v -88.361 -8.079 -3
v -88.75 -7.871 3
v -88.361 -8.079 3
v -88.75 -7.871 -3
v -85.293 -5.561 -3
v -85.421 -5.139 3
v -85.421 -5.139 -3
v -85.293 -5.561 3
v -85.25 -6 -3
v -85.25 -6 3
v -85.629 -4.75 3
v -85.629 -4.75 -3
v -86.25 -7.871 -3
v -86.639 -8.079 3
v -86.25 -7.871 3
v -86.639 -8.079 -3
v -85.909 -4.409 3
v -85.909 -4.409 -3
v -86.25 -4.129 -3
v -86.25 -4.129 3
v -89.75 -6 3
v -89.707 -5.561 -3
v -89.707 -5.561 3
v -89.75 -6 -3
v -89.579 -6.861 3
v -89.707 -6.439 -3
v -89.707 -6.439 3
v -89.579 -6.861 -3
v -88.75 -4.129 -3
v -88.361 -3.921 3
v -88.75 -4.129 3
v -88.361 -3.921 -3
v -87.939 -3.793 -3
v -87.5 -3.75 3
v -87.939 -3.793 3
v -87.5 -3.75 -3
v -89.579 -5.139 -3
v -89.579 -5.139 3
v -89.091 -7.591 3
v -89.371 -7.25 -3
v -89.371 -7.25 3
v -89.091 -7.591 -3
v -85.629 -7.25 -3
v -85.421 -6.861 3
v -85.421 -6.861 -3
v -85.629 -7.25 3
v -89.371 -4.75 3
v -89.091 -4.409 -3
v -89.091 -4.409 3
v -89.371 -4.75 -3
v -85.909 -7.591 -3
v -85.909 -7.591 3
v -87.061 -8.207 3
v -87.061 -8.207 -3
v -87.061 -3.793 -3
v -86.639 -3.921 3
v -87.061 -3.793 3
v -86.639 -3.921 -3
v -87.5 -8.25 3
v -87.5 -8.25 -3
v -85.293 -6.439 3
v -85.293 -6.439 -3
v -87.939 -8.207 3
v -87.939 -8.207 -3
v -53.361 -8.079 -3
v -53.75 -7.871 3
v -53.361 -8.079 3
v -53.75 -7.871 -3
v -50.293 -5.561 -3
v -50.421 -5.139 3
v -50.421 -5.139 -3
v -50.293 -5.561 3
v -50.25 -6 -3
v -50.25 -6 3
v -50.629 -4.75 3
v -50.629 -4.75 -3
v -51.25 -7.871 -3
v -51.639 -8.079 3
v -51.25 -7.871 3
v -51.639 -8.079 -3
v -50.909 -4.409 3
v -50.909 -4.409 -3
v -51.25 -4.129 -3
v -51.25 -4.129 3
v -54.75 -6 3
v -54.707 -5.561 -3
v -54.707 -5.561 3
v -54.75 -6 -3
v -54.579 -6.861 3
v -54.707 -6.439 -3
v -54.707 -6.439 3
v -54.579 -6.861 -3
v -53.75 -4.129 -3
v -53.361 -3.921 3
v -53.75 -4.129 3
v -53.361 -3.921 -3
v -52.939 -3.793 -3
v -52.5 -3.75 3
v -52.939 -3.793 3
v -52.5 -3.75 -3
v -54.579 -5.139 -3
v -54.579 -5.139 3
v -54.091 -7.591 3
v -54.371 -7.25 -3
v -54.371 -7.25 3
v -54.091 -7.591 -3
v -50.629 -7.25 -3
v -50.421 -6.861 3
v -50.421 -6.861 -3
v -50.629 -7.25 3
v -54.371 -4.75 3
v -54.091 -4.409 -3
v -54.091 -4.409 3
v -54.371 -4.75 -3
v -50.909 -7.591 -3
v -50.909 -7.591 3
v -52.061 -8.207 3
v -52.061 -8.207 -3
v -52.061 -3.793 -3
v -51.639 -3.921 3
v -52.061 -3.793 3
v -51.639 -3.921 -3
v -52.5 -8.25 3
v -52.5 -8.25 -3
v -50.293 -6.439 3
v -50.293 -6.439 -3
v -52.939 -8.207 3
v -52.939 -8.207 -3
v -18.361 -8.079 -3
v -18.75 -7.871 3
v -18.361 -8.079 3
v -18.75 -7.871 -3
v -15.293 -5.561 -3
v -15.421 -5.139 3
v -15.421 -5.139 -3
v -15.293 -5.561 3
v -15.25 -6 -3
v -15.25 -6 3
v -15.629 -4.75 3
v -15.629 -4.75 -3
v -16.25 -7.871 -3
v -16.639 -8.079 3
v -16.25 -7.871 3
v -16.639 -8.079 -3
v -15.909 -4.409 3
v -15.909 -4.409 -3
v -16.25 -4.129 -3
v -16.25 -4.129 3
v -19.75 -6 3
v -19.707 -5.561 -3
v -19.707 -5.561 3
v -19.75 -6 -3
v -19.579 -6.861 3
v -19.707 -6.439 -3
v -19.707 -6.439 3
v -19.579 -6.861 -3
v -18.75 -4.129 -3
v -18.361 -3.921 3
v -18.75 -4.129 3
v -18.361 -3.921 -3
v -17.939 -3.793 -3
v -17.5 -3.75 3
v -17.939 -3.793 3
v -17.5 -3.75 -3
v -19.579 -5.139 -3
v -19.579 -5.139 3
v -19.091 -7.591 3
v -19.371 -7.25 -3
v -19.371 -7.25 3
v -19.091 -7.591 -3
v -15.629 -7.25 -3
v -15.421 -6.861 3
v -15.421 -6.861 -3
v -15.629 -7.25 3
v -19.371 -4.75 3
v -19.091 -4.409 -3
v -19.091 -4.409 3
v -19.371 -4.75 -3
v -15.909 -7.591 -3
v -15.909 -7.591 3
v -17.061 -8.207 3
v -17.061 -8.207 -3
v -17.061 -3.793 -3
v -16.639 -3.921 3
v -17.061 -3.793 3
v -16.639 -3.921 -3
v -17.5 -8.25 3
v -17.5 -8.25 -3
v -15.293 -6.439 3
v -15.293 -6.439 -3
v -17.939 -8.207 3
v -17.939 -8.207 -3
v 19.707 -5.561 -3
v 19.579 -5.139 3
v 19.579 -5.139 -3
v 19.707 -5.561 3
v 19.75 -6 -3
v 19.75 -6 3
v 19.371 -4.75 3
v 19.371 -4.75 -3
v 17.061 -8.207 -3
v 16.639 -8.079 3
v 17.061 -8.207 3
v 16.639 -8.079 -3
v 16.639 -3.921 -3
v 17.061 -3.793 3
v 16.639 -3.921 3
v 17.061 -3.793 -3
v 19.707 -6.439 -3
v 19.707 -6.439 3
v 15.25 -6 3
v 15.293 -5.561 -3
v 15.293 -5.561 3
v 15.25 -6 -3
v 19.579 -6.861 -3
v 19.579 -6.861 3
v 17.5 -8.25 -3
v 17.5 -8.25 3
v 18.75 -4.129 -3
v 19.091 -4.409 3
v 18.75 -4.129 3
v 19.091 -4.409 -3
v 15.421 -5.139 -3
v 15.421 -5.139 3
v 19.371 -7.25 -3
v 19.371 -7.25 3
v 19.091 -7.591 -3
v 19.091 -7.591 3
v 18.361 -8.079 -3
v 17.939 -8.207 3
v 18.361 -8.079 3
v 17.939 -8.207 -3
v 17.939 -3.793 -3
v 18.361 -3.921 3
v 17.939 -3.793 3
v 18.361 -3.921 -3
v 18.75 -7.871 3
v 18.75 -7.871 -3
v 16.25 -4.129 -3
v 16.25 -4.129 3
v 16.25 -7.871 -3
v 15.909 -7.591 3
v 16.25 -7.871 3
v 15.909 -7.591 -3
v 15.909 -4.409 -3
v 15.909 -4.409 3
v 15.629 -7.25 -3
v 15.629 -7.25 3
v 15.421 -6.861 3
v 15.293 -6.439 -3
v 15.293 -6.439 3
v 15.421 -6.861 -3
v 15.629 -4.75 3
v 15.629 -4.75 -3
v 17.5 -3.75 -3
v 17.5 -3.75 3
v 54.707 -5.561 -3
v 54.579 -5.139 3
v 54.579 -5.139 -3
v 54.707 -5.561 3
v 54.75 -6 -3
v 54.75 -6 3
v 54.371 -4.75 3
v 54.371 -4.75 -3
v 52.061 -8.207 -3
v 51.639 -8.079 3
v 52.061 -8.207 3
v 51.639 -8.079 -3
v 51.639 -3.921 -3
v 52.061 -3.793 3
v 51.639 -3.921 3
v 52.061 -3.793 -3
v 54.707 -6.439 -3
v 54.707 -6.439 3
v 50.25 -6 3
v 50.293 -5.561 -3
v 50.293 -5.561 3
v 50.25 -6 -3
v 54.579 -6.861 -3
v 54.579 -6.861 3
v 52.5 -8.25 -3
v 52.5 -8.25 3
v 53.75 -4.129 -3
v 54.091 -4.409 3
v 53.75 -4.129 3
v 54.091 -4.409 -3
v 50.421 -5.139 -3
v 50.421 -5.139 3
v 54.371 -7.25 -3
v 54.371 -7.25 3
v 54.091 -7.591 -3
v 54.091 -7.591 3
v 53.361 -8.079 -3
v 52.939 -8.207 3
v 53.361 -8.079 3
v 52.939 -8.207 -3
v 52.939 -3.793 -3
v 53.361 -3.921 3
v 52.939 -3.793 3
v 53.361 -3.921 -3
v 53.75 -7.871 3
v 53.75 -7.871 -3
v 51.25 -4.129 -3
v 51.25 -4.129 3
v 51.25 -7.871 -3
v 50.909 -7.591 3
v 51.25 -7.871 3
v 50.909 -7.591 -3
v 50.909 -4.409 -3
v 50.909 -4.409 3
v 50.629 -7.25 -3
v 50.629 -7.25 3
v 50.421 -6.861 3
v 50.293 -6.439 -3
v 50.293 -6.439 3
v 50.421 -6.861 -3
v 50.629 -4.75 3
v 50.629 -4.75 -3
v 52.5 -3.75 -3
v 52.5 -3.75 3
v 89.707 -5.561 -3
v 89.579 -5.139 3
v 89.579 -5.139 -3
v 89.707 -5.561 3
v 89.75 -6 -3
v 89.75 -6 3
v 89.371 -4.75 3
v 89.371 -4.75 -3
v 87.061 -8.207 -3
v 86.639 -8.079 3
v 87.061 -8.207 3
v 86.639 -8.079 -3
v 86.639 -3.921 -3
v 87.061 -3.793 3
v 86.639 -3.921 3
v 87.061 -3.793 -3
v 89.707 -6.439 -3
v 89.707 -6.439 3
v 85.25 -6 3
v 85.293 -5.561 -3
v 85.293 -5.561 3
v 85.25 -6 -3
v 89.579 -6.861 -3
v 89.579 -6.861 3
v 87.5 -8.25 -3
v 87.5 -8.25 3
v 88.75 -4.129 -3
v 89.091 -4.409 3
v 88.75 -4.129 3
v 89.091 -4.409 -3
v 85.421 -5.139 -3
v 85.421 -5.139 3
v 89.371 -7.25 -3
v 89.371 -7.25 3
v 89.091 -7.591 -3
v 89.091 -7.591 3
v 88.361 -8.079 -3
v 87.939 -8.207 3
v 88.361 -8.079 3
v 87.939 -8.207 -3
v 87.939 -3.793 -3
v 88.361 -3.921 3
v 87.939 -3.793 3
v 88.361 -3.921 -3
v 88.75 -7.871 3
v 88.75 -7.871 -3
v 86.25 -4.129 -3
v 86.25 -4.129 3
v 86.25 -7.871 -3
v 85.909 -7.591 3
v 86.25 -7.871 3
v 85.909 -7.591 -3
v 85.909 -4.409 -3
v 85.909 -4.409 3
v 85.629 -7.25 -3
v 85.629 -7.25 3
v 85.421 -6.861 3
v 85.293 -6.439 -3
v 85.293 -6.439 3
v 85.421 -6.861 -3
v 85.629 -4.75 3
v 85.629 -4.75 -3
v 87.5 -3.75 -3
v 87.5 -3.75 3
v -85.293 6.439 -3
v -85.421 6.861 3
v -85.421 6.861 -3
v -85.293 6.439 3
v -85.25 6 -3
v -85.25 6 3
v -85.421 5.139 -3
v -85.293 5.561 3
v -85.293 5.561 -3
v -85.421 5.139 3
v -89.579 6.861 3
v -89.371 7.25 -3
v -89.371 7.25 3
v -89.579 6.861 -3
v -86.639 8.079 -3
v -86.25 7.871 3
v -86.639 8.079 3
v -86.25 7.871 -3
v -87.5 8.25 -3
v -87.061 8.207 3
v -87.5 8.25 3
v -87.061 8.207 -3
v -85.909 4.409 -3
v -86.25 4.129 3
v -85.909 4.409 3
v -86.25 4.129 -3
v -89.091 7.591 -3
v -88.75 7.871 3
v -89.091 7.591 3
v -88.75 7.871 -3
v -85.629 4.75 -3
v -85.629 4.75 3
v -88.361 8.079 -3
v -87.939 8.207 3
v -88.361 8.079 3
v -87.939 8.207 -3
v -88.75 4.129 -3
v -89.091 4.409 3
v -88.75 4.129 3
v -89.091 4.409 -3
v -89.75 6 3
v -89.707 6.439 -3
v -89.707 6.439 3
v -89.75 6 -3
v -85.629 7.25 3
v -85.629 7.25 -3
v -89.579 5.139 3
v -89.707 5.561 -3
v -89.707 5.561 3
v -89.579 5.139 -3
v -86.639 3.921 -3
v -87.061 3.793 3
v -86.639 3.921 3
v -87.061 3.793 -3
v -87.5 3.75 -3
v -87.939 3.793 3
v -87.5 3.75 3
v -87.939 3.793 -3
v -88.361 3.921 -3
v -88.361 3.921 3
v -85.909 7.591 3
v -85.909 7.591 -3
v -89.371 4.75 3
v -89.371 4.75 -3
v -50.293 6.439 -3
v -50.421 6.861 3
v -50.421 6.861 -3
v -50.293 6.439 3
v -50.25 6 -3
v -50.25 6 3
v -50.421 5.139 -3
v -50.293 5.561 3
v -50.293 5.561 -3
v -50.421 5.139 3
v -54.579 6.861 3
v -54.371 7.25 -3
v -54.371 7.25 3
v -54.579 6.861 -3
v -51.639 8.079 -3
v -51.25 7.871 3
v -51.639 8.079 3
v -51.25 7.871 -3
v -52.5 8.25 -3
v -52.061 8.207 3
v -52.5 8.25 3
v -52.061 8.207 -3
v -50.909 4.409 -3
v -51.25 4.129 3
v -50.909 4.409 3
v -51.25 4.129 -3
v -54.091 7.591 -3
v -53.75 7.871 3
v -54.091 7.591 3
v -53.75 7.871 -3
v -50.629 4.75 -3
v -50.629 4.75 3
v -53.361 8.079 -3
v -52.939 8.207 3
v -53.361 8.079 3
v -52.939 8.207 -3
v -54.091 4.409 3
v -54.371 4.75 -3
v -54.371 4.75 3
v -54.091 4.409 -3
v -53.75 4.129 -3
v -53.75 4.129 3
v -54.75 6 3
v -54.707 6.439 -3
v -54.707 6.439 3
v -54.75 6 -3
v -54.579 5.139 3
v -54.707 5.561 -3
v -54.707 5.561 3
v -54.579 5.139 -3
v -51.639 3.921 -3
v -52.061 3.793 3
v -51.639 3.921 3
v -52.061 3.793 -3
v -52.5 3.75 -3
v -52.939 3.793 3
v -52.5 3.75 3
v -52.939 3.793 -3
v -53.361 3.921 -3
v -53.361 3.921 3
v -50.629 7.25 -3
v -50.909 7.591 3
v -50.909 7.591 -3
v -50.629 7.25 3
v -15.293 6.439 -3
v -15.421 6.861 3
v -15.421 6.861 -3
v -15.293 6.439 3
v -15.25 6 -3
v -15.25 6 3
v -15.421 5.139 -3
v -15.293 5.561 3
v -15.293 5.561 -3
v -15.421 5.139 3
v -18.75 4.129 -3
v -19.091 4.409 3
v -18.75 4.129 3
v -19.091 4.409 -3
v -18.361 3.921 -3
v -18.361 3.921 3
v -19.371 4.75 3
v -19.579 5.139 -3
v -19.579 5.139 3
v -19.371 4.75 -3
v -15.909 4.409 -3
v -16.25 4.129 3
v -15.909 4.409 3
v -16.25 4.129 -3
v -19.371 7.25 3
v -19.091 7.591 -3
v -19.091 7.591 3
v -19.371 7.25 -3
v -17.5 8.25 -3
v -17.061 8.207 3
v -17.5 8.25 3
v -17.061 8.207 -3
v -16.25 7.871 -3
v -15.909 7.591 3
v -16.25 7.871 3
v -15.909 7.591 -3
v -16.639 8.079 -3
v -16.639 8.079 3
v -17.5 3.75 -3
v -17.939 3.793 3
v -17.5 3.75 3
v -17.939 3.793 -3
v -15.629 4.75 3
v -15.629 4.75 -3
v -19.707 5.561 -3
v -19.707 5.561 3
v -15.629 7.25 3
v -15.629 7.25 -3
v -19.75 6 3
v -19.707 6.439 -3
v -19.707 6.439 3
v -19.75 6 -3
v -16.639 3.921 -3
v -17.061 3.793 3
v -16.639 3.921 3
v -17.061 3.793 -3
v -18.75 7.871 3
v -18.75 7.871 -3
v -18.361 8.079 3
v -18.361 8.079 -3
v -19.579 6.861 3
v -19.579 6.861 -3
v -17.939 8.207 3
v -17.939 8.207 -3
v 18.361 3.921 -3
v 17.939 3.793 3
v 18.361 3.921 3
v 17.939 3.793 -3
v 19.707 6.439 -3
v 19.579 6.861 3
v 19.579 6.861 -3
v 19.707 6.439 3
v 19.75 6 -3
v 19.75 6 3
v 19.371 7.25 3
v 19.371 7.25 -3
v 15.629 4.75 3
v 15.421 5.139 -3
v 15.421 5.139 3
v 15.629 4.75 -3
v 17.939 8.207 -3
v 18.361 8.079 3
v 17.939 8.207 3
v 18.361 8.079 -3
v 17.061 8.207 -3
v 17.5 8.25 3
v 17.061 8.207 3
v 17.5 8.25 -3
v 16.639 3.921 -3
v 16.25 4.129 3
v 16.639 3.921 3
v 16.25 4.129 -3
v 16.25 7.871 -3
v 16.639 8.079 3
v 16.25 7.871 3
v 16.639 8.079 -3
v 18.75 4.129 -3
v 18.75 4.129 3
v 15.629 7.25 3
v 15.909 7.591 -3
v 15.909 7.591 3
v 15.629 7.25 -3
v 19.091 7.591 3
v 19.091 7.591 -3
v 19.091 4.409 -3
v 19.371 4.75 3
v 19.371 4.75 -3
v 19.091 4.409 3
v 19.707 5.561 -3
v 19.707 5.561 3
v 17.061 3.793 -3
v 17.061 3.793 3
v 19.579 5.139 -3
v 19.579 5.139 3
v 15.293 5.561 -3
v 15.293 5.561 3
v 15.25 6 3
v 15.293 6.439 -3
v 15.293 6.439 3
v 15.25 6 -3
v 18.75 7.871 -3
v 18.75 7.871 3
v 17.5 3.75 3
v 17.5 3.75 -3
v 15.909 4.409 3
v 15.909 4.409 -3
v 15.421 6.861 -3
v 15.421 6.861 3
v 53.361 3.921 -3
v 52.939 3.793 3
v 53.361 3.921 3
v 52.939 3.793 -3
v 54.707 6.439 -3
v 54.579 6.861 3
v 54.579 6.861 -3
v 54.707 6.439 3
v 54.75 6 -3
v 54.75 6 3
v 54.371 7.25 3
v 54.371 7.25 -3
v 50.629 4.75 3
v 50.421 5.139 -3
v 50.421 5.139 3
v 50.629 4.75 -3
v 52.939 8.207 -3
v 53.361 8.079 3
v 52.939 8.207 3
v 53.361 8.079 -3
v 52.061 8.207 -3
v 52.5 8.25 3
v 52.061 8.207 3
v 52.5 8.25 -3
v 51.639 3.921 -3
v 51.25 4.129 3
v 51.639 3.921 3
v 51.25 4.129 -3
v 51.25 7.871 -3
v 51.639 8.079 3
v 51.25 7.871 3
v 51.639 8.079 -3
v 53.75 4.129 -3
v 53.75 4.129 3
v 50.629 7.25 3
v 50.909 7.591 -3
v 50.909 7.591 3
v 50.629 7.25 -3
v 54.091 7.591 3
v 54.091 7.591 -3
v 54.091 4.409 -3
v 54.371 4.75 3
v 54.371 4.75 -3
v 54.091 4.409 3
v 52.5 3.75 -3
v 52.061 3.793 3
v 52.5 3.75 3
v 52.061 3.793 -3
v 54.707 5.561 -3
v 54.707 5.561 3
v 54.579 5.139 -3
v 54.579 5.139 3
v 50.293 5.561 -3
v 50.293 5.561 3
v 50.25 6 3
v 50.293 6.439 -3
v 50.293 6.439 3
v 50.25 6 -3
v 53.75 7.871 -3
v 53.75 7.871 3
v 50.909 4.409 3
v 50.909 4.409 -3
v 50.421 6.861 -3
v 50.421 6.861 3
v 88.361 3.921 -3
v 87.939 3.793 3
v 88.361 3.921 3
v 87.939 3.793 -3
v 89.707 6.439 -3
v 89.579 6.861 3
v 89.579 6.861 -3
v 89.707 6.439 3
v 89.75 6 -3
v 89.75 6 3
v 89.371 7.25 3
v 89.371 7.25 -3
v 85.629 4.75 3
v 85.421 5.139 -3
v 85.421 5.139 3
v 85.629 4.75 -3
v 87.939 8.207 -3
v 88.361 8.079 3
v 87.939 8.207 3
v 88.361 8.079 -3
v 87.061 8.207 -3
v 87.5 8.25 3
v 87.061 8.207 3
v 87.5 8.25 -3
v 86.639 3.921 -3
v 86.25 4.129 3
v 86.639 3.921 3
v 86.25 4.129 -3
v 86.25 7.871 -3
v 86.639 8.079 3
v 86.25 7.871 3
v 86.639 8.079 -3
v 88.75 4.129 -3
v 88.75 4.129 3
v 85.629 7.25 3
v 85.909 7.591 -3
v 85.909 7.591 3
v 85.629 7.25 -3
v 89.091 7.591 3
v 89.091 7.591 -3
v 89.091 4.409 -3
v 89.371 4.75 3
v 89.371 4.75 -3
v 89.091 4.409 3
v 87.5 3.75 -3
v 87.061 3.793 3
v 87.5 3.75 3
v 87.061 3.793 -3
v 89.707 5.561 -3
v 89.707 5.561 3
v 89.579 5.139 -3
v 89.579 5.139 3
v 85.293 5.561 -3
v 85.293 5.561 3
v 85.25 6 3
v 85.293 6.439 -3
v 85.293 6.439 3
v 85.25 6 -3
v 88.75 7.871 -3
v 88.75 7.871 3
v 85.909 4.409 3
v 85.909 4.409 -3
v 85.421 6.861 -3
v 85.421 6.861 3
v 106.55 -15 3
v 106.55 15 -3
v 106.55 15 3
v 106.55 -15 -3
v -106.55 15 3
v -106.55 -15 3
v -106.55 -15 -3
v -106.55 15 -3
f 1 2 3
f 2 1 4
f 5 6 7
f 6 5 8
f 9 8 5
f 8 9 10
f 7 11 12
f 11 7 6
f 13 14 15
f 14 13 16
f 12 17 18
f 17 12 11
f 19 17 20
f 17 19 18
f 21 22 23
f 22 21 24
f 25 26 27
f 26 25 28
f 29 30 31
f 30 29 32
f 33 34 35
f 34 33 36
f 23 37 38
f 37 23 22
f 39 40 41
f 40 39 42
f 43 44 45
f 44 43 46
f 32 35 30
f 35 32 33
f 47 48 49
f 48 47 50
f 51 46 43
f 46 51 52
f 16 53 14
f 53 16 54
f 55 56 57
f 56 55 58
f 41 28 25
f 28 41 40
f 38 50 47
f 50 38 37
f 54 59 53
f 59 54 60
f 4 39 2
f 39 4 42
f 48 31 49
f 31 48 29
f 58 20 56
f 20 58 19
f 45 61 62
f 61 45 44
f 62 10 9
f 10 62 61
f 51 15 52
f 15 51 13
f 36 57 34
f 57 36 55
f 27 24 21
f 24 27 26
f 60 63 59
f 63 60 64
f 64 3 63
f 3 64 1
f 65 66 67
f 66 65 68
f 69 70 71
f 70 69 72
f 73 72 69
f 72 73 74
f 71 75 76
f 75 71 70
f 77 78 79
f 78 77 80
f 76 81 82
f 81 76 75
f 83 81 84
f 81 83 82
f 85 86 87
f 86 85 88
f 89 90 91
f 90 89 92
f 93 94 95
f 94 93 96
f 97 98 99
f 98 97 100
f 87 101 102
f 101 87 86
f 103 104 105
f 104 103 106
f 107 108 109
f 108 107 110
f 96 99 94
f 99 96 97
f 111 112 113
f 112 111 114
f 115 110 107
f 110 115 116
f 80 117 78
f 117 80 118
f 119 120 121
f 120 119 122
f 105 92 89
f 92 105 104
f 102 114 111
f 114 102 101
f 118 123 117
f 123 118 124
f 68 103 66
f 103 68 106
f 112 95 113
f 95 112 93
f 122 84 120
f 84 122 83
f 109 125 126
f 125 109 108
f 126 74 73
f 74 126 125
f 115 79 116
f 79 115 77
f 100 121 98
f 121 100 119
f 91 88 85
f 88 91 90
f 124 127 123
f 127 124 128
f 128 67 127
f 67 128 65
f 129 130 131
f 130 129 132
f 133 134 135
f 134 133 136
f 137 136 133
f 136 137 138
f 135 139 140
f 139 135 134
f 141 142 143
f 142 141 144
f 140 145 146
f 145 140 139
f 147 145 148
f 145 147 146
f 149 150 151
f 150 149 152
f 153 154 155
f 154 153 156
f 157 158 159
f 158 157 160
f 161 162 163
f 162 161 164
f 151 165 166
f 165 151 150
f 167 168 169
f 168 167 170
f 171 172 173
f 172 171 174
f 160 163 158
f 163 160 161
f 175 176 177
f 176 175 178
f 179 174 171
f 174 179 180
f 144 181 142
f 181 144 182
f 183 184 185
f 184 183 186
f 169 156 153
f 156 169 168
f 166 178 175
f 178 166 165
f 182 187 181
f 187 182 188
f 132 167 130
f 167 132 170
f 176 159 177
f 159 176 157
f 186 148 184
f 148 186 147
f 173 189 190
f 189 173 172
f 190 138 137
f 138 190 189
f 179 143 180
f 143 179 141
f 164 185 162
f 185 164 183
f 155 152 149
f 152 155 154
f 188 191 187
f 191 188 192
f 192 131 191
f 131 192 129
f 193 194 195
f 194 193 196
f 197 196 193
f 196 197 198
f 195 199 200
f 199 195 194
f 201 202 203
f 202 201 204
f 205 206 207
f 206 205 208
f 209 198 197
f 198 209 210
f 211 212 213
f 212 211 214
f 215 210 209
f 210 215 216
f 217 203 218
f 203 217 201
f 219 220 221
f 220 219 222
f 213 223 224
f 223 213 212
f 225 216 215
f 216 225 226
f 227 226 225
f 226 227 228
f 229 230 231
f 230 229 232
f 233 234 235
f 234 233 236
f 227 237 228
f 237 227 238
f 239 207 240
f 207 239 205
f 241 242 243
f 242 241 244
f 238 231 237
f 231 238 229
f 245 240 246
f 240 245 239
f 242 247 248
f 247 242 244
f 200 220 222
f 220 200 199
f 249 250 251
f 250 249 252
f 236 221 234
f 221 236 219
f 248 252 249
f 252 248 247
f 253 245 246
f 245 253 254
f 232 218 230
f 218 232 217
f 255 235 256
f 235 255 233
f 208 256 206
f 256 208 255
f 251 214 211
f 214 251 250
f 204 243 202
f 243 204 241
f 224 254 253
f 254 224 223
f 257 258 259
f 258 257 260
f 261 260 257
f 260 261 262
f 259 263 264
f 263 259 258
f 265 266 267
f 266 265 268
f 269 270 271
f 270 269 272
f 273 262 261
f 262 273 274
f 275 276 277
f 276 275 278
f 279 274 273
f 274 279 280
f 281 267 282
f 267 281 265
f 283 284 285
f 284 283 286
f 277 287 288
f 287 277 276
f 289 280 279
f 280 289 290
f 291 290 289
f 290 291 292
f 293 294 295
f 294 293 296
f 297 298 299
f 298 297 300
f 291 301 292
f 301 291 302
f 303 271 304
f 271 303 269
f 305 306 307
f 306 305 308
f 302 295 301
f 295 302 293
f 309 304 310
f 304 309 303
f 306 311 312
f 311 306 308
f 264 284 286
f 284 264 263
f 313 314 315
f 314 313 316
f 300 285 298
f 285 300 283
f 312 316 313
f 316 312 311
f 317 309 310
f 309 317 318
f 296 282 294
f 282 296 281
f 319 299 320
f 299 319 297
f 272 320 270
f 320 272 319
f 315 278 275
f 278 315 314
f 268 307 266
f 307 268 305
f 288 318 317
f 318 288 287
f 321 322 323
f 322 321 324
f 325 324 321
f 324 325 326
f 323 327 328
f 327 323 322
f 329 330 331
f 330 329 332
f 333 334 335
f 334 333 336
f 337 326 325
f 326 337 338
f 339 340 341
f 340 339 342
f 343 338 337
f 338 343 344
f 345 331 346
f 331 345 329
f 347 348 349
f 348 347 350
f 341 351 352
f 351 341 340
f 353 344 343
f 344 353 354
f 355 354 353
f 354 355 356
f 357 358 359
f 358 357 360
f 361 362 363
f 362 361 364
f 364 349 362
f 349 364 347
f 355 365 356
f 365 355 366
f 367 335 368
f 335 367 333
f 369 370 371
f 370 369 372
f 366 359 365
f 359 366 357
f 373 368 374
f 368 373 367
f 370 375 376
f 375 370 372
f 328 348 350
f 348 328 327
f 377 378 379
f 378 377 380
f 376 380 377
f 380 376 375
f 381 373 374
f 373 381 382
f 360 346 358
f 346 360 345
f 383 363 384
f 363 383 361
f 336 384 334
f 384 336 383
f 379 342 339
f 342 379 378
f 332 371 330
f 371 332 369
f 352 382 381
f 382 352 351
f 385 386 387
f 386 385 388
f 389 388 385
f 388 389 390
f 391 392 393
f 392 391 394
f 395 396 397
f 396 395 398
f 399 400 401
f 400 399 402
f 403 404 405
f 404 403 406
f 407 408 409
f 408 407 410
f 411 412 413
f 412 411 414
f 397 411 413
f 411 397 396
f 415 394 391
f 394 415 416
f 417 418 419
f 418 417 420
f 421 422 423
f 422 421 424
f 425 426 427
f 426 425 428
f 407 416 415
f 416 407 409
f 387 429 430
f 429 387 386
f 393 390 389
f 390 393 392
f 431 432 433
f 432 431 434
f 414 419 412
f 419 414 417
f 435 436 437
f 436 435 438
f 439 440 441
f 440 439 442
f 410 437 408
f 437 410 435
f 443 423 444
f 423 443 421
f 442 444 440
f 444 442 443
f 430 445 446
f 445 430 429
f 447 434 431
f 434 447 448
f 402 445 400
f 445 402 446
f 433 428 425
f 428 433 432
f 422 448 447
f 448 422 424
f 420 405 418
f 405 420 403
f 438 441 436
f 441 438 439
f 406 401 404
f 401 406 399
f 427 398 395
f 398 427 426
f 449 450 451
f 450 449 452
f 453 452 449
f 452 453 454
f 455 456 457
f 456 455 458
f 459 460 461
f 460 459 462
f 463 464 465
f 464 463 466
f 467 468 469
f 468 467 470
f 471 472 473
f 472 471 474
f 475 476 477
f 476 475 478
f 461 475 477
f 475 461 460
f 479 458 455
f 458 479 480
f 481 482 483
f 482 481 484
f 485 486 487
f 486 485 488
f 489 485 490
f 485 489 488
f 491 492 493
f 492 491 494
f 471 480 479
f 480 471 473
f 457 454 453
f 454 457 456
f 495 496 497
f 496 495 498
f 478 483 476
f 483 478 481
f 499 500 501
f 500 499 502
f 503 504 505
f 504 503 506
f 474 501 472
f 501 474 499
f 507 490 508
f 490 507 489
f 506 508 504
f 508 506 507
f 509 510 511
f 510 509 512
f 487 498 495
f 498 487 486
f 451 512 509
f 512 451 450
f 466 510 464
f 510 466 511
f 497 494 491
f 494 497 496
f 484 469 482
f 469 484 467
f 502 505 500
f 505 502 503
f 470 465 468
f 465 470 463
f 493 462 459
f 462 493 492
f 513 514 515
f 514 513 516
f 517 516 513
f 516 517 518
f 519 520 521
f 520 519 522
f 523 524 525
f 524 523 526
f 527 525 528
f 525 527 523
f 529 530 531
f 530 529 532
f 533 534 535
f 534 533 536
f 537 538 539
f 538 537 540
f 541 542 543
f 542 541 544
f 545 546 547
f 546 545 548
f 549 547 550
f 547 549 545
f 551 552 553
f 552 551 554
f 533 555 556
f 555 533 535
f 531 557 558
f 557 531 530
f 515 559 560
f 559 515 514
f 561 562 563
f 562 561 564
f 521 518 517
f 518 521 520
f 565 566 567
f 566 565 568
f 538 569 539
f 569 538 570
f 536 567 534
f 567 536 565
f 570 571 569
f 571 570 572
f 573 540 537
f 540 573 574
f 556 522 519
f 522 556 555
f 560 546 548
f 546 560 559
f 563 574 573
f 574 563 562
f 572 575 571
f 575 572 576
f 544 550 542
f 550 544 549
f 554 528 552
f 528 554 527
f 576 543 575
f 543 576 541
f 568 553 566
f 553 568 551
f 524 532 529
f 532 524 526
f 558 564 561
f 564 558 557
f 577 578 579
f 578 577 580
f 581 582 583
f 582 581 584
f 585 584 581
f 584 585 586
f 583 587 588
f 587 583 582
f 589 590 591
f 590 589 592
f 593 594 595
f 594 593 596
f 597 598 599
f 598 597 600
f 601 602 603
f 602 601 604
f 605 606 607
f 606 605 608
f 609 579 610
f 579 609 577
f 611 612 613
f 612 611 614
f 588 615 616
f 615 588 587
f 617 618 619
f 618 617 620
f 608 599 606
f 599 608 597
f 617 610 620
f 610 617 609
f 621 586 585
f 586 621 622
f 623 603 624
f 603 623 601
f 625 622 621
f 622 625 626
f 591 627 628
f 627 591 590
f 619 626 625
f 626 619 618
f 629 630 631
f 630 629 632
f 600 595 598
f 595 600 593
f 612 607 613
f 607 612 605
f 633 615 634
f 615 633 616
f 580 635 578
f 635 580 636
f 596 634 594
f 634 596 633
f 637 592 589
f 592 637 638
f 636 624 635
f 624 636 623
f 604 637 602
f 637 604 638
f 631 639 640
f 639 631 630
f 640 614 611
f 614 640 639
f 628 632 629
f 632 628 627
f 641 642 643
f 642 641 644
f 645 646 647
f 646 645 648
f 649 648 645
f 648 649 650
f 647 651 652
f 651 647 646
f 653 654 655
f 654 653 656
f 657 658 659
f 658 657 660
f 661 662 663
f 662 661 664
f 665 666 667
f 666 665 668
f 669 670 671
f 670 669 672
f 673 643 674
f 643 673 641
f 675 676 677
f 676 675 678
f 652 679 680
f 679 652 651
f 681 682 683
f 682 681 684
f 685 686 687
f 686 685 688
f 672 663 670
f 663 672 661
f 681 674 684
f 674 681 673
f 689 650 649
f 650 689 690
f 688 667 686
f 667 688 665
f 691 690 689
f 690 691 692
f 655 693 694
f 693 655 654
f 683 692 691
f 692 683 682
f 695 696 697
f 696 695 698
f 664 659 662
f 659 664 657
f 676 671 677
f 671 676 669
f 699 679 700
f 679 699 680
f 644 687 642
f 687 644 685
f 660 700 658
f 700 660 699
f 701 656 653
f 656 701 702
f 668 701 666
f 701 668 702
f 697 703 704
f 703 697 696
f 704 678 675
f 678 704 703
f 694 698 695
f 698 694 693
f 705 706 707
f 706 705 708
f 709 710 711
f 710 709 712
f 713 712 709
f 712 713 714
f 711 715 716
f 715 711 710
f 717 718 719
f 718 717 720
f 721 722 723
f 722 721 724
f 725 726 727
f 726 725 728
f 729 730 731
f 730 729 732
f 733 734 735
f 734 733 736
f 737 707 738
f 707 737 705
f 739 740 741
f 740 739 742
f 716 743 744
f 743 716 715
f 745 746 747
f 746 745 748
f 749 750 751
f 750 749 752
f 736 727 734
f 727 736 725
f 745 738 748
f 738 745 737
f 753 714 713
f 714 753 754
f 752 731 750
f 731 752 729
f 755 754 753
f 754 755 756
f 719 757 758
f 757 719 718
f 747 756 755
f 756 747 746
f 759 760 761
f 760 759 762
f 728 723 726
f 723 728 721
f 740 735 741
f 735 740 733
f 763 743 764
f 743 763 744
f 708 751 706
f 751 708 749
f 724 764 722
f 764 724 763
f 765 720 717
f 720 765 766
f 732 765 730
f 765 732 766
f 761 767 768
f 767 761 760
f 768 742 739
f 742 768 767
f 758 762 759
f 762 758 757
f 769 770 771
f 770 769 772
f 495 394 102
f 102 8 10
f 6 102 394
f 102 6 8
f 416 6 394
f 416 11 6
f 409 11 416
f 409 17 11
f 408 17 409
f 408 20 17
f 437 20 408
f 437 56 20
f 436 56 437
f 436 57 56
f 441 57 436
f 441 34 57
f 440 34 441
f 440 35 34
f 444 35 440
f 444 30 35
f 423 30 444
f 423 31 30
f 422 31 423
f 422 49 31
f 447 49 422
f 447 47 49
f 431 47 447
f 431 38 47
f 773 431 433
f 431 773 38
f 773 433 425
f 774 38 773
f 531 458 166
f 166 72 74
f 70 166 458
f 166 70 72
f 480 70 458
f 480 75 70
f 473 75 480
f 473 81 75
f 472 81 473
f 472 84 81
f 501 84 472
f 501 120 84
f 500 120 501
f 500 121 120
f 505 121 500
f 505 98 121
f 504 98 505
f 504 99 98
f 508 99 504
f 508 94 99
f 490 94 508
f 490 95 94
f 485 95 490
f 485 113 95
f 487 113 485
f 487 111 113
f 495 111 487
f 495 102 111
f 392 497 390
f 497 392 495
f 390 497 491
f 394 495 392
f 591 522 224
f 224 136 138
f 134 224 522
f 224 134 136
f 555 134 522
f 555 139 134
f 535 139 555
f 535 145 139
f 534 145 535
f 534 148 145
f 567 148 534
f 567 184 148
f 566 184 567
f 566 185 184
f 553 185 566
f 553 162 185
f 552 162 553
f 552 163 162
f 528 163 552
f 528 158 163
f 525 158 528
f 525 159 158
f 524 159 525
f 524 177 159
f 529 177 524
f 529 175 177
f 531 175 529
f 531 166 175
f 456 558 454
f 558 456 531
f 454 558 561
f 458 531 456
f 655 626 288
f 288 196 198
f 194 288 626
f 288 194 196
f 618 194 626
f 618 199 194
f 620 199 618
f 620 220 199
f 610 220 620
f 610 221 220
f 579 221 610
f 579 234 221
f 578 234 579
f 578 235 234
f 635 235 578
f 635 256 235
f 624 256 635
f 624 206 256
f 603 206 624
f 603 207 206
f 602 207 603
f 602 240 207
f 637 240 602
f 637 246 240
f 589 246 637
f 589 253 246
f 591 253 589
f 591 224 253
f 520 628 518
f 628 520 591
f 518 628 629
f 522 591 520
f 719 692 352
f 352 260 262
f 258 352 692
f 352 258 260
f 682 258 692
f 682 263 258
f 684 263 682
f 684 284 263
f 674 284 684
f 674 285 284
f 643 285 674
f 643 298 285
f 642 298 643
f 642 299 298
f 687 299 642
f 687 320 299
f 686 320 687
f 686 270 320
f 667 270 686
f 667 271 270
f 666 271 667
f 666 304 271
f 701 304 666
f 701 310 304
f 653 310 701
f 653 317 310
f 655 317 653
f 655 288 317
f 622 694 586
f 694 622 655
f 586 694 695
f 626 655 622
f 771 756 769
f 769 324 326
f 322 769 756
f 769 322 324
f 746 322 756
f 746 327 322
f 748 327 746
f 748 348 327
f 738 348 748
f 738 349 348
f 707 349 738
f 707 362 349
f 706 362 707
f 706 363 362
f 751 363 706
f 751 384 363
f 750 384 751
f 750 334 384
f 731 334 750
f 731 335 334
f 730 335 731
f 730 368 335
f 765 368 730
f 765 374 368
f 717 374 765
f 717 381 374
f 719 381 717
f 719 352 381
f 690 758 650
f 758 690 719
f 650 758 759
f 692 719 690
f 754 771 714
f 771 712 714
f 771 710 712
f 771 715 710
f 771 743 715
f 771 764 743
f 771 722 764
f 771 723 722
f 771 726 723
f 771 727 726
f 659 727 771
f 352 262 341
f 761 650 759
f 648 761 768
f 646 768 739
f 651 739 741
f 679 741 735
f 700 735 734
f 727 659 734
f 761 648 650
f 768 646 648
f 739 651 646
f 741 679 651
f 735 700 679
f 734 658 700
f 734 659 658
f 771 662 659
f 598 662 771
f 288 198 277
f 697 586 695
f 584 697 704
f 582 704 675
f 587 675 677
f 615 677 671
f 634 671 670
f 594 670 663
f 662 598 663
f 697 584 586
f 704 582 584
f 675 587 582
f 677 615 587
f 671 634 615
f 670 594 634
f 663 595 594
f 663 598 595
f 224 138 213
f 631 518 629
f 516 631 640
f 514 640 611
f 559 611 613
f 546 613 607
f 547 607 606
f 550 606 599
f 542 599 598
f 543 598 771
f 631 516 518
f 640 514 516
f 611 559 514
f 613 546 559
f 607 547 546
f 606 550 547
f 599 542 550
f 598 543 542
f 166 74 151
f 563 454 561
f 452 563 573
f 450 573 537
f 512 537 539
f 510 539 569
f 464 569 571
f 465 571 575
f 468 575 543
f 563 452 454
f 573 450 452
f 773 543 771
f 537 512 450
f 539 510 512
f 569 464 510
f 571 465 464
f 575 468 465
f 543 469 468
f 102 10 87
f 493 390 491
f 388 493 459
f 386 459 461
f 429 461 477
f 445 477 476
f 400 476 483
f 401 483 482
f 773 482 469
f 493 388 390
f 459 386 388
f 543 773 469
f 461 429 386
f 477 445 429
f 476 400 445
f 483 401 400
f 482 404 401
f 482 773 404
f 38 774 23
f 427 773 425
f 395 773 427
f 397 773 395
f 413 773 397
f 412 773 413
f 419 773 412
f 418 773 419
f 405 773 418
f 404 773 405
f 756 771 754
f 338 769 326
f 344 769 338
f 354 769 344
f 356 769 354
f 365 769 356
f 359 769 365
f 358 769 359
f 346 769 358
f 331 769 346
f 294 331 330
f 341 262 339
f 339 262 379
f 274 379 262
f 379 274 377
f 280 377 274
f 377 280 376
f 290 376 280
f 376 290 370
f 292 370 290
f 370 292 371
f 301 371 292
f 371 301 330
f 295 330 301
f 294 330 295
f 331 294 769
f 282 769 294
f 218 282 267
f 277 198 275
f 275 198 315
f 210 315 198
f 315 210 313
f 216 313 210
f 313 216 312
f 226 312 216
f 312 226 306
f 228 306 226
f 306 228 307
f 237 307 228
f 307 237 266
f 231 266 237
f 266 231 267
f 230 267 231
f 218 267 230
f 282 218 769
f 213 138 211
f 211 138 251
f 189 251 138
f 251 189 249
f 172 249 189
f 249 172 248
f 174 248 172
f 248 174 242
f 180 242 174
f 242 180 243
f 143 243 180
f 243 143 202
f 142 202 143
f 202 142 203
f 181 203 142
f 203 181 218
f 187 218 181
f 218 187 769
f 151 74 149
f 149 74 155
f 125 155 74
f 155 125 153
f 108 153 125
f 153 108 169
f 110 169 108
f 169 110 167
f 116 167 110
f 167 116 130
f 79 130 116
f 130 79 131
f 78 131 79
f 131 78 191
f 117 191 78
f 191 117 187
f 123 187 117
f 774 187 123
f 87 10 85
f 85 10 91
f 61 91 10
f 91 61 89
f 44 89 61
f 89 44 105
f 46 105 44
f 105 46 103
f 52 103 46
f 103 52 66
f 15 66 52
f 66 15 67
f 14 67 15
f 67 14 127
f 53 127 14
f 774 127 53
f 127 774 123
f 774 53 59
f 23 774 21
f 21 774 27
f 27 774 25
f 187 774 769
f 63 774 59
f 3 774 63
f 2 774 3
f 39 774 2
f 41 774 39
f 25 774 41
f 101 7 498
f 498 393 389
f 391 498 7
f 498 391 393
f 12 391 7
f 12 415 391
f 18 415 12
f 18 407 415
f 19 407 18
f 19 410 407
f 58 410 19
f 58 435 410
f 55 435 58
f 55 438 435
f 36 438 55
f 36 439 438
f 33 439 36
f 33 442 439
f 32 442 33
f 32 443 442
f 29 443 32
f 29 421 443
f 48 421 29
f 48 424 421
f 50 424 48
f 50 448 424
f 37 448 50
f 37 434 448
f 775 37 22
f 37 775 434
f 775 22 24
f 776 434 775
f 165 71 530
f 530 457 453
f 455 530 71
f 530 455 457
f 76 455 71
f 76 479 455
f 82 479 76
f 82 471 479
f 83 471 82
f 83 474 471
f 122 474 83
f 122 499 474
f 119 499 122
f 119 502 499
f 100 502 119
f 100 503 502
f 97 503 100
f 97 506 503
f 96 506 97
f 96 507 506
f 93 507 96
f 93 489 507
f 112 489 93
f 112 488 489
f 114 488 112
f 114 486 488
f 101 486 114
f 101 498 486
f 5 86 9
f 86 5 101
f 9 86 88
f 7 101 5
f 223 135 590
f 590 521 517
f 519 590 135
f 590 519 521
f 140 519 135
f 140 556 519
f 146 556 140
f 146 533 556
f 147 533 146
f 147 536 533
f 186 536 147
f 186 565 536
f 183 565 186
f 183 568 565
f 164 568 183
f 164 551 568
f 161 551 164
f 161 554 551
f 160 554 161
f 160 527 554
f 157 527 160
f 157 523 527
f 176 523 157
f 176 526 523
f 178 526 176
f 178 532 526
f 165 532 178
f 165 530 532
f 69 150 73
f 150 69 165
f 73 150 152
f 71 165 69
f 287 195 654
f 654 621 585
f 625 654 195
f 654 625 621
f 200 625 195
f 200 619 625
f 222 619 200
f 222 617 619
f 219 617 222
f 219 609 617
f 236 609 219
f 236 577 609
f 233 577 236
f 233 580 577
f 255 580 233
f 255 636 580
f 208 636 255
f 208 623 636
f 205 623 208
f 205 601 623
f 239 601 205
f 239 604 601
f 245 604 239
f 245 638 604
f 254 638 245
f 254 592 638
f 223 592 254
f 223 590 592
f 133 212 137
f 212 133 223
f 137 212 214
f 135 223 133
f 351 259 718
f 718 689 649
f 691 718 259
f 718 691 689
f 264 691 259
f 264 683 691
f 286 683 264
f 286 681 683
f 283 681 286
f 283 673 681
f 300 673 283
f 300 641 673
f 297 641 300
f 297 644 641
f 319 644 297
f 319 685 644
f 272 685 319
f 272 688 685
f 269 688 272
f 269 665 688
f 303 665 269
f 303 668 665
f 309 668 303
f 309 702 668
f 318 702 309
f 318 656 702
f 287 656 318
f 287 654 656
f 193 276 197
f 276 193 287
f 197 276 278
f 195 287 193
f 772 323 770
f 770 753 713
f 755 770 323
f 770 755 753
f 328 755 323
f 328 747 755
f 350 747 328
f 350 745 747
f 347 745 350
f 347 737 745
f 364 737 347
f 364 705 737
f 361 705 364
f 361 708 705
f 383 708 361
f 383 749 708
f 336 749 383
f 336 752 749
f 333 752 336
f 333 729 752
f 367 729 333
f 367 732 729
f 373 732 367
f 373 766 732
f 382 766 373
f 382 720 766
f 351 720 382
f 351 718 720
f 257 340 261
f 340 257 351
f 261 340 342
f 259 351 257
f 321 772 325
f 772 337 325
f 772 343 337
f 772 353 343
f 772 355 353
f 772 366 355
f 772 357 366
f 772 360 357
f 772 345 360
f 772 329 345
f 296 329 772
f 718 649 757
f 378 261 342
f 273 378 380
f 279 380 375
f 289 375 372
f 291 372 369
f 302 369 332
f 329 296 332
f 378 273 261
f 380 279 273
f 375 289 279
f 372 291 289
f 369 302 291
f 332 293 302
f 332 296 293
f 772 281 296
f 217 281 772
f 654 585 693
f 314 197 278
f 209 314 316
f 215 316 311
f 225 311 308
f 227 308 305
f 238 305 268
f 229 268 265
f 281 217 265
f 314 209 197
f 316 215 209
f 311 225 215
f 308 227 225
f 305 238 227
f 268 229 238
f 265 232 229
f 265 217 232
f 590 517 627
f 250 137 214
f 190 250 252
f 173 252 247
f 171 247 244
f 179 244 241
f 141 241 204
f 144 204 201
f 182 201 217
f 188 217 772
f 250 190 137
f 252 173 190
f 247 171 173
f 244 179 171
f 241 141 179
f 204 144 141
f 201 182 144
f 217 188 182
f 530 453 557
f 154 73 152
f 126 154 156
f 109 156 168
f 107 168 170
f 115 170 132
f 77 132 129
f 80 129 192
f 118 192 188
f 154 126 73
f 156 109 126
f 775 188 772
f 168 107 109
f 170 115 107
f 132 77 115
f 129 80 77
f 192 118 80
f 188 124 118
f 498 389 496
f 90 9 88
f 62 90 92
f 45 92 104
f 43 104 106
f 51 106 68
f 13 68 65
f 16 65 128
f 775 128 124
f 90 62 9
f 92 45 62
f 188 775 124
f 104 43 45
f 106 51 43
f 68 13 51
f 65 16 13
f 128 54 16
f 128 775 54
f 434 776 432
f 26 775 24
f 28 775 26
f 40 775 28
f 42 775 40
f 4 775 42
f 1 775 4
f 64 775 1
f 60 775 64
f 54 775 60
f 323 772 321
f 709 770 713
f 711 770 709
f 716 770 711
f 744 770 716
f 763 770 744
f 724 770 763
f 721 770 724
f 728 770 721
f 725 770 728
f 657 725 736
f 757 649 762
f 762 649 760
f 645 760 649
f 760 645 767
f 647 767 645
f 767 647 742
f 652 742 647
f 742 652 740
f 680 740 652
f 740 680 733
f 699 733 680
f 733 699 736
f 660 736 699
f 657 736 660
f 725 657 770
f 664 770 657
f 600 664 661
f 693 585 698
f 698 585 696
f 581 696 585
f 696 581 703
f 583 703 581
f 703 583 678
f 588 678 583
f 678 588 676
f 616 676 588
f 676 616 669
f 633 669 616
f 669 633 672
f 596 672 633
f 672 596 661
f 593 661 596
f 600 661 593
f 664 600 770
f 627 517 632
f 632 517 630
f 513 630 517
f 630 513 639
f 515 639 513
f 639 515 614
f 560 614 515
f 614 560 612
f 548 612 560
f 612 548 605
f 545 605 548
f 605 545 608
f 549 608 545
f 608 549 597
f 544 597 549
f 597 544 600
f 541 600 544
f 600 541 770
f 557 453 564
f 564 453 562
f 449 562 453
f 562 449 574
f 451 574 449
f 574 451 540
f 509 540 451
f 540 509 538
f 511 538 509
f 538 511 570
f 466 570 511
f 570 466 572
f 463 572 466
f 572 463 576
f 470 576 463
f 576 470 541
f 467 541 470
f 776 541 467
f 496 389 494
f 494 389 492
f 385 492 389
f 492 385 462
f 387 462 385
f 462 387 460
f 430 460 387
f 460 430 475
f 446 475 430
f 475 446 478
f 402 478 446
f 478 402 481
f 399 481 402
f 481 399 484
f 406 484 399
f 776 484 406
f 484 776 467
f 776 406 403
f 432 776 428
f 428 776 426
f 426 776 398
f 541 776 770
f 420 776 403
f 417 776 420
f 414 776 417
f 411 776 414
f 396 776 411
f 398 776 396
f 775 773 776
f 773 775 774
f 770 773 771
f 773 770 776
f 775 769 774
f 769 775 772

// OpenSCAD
$fn = 32;

// ----------------------------------------------------------------------
// Hole bar, 6 x Ø4.5
// tworows layout, 19.05 mm edge offset
// ----------------------------------------------------------------------

// --- parameters (mm) ---
bar_w = 30;       // bar width (Y)
bar_t = 6;        // bar thickness (Z)
holes = 6;        // holes per row
hole_d = 4.5;     // hole diameter
edge = 19.05;     // offset from the bar end to the first hole
pitch = 35;       // pitch between neighbouring holes
row_offset = 12;  // distance between the two rows

// --- derived feature positions (mm) ---
span = (holes - 1) * pitch;   // = 175   distance between the end holes
bar_l = span + 2 * edge;      // = 213.1   overall bar length
start_x = -bar_l / 2 + edge;  // = -87.5   X of the first hole
feature_centers = [
  [start_x + 0 * pitch, -row_offset / 2],
  [start_x + 1 * pitch, -row_offset / 2],
  [start_x + 2 * pitch, -row_offset / 2],
  [start_x + 3 * pitch, -row_offset / 2],
  [start_x + 4 * pitch, -row_offset / 2],
  [start_x + 5 * pitch, -row_offset / 2]
];   // hole centres of the first row
row2_centers = [
  [start_x + 0 * pitch, row_offset / 2],
  [start_x + 1 * pitch, row_offset / 2],
  [start_x + 2 * pitch, row_offset / 2],
  [start_x + 3 * pitch, row_offset / 2],
  [start_x + 4 * pitch, row_offset / 2],
  [start_x + 5 * pitch, row_offset / 2]
];   // hole centres of the second row

// bar with two rows of holes, both read from their own centre arrays
difference() {
  translate([-bar_l / 2, -bar_w / 2, -bar_t / 2]) cube([bar_l, bar_w, bar_t]);
  for (centre = feature_centers)
    translate([centre[0], centre[1], 0])
      cylinder(d = hole_d, h = bar_t + 2, center = true);
  for (centre = row2_centers)
    translate([centre[0], centre[1], 0])
      cylinder(d = hole_d, h = bar_t + 2, center = true);
}
